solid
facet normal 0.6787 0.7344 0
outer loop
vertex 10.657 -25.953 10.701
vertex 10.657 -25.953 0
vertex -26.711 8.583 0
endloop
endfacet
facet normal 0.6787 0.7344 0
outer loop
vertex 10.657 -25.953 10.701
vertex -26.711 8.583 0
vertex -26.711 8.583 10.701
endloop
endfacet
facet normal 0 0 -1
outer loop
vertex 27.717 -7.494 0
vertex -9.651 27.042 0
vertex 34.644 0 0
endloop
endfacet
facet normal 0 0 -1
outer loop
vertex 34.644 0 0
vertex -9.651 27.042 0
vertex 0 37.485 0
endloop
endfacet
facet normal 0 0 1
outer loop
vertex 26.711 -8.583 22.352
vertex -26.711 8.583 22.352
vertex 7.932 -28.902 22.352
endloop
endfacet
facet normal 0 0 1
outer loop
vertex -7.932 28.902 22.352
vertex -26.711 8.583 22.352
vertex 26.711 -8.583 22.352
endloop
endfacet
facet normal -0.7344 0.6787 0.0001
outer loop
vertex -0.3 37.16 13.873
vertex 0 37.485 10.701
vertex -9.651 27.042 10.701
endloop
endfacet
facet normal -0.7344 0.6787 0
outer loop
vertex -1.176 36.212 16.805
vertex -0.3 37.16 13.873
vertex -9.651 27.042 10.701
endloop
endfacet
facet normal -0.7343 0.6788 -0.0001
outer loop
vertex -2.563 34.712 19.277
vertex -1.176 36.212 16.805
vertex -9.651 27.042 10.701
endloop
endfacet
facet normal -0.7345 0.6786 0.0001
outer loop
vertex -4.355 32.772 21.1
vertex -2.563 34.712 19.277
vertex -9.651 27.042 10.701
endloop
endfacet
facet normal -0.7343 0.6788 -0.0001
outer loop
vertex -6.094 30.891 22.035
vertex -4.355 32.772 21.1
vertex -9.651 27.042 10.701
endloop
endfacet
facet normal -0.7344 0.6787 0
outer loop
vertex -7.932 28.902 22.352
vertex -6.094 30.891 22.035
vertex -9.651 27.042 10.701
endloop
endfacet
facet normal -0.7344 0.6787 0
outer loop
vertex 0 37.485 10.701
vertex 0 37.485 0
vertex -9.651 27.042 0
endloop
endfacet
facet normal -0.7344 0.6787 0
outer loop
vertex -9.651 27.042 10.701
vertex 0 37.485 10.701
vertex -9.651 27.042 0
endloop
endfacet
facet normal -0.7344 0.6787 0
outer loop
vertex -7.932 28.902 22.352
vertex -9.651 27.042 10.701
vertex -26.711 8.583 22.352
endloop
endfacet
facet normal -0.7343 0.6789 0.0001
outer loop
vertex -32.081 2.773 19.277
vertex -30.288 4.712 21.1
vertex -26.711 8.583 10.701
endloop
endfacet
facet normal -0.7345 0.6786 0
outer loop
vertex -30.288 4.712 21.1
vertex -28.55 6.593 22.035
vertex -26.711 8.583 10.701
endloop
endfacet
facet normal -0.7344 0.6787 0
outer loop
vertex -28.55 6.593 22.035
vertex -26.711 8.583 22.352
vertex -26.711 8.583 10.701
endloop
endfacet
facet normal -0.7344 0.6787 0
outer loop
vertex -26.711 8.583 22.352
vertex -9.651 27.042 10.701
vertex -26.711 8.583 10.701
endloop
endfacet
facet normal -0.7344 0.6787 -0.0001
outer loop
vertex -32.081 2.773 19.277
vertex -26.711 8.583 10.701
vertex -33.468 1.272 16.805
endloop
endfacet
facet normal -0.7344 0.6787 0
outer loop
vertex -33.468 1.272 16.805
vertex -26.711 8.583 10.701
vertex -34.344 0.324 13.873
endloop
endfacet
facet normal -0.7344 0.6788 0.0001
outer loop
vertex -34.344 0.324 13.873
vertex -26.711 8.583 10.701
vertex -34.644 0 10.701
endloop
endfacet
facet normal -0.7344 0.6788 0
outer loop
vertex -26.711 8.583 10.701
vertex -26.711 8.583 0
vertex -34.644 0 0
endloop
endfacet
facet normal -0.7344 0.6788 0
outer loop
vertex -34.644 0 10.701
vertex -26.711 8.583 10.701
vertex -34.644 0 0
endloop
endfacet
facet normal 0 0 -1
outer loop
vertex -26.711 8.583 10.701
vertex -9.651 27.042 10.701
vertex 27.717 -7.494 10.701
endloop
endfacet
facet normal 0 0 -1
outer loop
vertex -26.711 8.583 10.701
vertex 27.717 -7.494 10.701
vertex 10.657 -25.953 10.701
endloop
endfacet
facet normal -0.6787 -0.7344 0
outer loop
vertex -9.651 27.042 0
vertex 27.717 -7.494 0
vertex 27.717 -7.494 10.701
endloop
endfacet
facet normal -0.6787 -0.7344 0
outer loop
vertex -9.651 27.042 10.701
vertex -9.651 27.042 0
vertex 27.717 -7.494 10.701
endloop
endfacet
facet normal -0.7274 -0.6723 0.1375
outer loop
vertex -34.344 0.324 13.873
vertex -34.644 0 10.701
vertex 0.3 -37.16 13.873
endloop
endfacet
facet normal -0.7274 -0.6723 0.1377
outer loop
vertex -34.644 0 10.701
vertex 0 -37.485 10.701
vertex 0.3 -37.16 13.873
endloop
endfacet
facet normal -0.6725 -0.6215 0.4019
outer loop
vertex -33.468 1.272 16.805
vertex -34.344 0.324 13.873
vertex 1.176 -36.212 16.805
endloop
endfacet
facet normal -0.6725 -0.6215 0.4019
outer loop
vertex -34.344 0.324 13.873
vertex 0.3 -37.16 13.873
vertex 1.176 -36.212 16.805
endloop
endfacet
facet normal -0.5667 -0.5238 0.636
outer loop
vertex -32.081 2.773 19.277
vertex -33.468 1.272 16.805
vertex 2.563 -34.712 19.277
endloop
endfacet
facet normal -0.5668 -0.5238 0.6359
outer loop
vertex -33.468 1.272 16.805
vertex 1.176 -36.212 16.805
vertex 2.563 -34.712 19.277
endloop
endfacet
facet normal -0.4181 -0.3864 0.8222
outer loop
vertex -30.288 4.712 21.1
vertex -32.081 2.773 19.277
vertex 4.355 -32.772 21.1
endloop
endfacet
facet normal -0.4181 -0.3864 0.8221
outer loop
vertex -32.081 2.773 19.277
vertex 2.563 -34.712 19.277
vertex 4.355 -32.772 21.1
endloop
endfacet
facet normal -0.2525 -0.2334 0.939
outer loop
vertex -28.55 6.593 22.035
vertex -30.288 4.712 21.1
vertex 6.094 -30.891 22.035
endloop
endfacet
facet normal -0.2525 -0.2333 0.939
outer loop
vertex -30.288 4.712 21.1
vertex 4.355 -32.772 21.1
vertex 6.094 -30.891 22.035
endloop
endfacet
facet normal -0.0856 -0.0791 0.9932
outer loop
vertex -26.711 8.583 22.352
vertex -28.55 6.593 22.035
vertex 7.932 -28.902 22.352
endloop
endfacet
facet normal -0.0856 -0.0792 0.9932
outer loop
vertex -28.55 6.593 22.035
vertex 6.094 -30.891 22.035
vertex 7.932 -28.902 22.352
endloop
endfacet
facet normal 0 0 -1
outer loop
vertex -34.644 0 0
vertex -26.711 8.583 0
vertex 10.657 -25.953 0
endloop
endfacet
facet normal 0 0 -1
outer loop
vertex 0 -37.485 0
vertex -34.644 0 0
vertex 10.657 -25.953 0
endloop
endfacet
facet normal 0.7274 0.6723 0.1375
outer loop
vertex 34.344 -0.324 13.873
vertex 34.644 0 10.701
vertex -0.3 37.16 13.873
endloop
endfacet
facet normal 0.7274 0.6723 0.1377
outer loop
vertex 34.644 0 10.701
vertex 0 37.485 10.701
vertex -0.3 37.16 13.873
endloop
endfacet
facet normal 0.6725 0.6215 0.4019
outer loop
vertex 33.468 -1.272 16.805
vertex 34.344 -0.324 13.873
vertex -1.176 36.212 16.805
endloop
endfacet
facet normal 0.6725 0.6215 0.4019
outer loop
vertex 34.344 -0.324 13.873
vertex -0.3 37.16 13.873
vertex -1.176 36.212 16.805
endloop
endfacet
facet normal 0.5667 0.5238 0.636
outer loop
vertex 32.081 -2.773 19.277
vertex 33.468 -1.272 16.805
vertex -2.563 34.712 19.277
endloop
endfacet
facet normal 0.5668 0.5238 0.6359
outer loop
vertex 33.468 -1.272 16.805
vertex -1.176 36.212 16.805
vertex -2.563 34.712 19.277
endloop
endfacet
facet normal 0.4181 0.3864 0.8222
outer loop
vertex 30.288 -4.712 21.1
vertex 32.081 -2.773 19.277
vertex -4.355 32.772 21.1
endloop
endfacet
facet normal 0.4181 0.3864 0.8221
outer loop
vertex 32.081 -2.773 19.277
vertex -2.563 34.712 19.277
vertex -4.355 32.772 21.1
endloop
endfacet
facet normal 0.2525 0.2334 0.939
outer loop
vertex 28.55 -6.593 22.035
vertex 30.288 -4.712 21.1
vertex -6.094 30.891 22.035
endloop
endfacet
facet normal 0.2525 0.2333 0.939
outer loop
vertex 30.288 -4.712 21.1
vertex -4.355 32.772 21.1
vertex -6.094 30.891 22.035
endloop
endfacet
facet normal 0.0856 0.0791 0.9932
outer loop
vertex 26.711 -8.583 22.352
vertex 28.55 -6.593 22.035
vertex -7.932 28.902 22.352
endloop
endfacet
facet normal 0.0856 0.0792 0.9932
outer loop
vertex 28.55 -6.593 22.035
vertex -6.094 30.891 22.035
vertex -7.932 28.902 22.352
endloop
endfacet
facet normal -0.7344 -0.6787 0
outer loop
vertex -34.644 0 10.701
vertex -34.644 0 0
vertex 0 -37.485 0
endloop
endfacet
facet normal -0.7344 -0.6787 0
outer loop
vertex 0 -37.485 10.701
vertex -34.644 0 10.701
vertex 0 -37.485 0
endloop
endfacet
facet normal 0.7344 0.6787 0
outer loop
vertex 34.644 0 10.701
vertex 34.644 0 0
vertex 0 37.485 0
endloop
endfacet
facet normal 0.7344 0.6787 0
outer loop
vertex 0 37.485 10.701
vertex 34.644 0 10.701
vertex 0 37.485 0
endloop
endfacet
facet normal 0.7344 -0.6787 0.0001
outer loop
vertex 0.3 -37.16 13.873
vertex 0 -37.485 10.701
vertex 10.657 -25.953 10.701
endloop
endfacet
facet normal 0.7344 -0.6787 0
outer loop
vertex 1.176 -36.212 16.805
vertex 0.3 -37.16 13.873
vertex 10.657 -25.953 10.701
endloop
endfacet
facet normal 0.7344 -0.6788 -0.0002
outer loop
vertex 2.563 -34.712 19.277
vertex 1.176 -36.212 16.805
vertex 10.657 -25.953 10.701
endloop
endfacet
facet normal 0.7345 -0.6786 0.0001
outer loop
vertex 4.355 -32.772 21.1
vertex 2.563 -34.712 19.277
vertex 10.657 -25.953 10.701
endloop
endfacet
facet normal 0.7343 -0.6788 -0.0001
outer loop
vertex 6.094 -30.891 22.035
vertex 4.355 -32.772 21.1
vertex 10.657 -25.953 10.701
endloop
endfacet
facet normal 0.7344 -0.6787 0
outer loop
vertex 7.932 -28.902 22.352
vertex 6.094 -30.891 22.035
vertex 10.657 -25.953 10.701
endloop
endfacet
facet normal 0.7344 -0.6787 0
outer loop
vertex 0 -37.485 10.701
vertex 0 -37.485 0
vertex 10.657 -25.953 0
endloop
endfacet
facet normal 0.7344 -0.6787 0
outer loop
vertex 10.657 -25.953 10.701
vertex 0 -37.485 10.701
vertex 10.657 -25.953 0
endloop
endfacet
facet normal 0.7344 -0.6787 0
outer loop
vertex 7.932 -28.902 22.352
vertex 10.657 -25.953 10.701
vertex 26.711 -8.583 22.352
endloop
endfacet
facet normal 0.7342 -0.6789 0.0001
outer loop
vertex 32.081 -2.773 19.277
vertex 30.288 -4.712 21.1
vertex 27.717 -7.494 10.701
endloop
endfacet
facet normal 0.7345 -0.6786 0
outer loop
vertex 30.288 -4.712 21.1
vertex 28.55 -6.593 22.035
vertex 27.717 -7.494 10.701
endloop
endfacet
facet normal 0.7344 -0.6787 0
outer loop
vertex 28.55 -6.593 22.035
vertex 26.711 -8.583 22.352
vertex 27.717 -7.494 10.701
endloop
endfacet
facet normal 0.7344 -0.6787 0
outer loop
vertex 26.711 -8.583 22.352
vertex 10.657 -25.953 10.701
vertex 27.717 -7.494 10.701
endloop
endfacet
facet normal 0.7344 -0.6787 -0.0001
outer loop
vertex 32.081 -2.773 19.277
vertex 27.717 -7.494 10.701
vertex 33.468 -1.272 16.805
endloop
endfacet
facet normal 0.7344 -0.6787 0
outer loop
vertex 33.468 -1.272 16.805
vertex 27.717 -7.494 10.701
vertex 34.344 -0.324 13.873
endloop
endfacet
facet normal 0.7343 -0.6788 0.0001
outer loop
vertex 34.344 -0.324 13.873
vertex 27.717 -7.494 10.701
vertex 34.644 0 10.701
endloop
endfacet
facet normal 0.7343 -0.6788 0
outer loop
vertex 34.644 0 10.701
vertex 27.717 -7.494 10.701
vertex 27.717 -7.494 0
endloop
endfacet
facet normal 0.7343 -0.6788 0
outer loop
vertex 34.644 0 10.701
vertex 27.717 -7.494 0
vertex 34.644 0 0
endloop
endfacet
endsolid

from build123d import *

# Parameters (mm, degrees)
F1_DEPTH = 22.352
F2_R     = 11.650994652
F3_W     = 25.1348185512
F3_H     = 10.701005348
F5_DEPTH = 76.326557987


with BuildPart() as f1:
    # F0 (on Top) → F1 (new body)
    with BuildSketch(Plane.XY):
        Polygon((0, 37.4846383929), (-34.6435047686, 0), (0, -37.4846383929), (34.6435047686, 0), align=None)
    extrude(amount=F1_DEPTH)

    # F2
    f2_edges = [f1.edges().sort_by_distance(p)[0] for p in [
        (-17.321752, -18.742319, 22.352),
        (17.321752, 18.742319, 22.352),
    ]]
    fillet(f2_edges, radius=F2_R)

    # F3 (on face) → F5 (cut, through all)
    with BuildSketch(Plane(origin=(-18.6842489296, 17.2680835308, 0), x_dir=(-0.6787274402, -0.7343902654, 0), z_dir=(-0.7343902654, 0.6787274402, 0))):
        with Locations((-0.7411176725, 5.350502674)):
            Rectangle(F3_W, F3_H)
    extrude(amount=-F5_DEPTH, mode=Mode.SUBTRACT)


solid = f1.part
